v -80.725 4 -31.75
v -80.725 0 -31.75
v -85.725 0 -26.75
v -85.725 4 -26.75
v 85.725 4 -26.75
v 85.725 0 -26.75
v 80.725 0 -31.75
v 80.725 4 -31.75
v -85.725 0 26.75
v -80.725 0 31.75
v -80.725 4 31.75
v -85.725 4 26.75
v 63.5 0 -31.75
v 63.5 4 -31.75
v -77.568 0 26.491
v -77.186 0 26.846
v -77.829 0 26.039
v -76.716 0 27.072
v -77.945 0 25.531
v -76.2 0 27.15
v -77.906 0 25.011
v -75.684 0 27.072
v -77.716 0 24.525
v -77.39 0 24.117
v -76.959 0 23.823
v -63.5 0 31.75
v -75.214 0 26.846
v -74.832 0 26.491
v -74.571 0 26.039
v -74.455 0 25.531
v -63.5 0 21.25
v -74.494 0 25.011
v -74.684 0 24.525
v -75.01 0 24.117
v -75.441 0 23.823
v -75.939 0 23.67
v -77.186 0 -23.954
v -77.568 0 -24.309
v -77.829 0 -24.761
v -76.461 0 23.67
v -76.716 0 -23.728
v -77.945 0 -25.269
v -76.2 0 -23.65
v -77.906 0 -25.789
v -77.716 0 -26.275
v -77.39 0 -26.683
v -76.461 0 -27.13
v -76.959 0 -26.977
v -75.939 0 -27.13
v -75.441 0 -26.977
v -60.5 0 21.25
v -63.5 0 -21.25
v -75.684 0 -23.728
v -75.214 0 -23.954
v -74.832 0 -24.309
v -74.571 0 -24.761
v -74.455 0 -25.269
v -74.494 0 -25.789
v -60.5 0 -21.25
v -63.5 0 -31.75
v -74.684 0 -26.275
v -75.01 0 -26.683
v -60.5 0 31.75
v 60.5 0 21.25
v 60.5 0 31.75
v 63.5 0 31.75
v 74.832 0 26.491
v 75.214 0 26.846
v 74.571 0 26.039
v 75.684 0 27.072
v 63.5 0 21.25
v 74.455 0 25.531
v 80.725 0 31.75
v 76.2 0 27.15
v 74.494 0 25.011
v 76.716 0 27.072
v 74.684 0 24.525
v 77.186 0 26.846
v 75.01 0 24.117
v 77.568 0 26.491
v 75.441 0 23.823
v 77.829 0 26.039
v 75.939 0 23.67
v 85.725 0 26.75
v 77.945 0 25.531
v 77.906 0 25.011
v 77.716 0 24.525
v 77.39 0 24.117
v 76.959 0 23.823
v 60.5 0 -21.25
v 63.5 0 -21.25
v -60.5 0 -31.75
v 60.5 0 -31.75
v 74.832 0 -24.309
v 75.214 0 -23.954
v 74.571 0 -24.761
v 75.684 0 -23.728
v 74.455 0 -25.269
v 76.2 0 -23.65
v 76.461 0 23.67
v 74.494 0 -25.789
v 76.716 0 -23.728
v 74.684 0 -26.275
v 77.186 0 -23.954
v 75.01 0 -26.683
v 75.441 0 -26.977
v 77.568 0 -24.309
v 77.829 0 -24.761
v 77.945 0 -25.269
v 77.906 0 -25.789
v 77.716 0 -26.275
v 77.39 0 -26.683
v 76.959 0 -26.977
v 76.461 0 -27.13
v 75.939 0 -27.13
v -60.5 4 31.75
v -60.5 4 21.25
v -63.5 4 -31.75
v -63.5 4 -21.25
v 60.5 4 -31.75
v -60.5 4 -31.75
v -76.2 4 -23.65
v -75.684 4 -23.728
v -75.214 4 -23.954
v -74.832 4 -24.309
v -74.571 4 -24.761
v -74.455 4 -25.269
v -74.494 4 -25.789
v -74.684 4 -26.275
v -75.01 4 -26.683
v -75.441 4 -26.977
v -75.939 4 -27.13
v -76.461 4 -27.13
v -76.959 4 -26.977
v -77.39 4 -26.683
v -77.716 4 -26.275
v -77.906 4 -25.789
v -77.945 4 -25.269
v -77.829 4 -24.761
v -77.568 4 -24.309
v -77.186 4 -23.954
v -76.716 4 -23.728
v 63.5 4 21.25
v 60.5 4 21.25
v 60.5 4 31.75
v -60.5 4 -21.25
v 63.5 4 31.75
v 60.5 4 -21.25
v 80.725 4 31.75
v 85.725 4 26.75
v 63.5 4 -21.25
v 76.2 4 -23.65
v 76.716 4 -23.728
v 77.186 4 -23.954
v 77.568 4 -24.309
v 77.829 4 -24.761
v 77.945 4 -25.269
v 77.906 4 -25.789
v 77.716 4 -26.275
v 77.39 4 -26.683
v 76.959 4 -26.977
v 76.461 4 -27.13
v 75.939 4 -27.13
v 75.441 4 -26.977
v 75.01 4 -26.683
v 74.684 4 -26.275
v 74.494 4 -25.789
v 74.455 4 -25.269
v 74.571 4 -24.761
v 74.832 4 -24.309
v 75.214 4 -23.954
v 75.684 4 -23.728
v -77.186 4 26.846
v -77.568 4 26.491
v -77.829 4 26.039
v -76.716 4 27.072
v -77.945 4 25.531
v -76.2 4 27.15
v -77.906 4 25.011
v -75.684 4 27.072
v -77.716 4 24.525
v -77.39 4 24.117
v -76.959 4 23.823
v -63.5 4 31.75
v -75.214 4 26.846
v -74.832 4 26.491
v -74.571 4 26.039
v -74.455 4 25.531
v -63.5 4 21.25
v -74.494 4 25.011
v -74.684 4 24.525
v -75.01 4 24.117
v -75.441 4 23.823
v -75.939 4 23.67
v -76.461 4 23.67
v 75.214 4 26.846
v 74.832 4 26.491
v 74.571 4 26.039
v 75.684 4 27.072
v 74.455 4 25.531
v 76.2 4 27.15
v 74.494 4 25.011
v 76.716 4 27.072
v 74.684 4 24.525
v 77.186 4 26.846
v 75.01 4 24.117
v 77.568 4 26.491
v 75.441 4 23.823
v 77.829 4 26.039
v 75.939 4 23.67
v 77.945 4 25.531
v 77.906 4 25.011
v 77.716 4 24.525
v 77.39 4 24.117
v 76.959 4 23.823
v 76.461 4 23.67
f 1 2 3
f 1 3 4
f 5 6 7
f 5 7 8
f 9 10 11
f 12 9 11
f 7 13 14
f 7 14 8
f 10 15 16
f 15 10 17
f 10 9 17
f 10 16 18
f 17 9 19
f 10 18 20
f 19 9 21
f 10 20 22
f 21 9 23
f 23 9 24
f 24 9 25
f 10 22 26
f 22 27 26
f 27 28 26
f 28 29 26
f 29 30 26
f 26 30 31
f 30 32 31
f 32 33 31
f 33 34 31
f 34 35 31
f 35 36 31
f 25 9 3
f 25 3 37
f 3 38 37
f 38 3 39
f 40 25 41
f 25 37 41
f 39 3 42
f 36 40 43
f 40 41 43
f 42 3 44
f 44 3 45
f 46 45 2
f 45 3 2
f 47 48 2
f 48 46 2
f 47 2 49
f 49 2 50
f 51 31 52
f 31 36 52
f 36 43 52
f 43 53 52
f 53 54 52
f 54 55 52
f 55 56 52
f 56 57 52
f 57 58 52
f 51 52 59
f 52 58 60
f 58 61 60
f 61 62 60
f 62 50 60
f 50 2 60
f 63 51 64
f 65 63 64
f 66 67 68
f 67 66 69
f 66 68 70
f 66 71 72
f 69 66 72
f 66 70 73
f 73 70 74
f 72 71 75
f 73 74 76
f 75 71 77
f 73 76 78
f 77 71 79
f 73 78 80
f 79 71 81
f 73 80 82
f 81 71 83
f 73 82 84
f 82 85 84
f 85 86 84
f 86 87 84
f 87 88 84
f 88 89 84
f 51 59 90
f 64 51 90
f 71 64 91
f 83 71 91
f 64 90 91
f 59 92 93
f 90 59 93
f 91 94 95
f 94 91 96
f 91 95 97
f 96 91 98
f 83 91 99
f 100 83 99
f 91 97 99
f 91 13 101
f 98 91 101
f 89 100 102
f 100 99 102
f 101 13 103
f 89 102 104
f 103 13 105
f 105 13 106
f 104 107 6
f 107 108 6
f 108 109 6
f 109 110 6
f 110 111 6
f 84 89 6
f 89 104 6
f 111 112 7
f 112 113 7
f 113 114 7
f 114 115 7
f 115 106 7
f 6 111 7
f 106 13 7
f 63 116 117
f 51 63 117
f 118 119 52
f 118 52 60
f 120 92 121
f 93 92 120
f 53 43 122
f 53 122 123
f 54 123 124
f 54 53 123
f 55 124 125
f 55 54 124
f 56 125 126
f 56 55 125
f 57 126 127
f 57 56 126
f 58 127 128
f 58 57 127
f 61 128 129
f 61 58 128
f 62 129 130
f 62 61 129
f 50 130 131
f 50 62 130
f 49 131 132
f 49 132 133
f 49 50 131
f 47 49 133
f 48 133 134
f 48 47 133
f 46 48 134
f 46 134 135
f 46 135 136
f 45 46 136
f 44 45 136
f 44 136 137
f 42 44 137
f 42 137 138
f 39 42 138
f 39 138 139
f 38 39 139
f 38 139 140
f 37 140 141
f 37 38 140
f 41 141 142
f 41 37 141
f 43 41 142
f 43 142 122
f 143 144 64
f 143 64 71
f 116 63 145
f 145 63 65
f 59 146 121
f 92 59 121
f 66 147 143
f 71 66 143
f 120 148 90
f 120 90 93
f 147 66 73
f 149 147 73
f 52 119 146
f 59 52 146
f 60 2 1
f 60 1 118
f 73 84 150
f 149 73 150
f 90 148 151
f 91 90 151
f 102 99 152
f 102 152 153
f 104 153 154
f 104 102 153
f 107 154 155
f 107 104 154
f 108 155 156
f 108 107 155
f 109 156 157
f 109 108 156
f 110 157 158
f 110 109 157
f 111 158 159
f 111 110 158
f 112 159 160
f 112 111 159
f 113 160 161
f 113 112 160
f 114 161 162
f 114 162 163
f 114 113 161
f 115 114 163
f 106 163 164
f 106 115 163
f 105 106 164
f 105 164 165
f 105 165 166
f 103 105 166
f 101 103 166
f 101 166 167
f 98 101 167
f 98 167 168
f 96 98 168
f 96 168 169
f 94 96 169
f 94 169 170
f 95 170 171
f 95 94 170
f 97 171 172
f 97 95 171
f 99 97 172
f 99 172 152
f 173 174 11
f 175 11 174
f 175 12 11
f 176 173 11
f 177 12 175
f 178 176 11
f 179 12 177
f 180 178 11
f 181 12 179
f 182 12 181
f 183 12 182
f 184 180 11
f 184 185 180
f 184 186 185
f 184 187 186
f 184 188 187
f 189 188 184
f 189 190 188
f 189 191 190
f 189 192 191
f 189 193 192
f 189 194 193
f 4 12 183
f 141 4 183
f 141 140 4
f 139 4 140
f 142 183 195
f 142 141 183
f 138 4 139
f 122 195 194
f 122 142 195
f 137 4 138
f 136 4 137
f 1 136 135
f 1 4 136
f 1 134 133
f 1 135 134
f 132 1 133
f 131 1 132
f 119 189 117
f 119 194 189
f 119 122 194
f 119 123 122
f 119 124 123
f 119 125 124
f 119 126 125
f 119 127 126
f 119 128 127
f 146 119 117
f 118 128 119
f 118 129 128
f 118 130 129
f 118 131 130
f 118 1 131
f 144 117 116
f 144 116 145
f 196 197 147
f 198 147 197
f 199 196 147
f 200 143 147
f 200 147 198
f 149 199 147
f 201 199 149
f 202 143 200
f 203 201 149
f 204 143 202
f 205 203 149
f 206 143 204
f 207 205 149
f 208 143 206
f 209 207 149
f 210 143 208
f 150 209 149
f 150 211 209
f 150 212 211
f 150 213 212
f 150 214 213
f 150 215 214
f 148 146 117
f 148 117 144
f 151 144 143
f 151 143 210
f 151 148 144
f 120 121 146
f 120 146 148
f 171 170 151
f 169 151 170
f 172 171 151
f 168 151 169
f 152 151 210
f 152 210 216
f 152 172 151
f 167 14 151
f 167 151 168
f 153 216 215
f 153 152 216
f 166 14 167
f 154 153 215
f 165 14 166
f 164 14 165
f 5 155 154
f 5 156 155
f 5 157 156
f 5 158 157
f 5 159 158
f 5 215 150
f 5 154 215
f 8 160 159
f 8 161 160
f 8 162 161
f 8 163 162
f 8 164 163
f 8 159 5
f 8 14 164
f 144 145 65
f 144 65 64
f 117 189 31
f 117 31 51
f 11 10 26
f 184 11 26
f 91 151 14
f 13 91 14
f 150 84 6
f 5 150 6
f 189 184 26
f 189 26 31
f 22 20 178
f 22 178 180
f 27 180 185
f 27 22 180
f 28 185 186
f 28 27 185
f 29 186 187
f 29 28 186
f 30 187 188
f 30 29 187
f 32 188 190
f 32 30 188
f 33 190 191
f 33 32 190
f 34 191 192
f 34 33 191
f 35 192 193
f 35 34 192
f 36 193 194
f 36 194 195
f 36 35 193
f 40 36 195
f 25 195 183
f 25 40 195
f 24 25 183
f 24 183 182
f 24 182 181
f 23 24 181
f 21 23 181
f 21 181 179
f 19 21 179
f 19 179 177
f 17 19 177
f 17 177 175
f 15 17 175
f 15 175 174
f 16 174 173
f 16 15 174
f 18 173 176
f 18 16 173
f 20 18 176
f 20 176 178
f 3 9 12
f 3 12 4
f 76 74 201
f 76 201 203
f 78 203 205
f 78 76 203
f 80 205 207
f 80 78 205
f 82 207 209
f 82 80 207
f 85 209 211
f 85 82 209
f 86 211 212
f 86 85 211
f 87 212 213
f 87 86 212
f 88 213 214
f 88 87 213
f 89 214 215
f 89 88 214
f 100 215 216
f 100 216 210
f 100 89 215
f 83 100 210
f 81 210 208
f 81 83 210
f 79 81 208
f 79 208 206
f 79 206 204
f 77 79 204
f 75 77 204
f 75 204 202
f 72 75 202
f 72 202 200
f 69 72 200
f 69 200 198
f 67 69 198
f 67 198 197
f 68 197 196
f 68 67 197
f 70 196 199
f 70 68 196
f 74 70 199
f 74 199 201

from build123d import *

# Parameters (mm, degrees)
SKETCH1_W           = 171.45
SKETCH1_H           = 63.5
SKETCH1_R           = 1.75
BOSS_EXTRUDE1_DEPTH = 4
CHAMFER1_SIZE       = 5
SKETCH3_W           = 3
SKETCH3_H           = 10.5
CUT_EXTRUDE2_DEPTH  = 4


with BuildPart() as part:
    # Sketch1 → Boss-Extrude1 (new body)
    with BuildSketch(Plane(origin=(0, 0, 0), x_dir=(1, 0, 0), z_dir=(0, 1, 0))):
        Rectangle(SKETCH1_W, SKETCH1_H)
        with Locations(Location((-76.2, 25.4, 0), (0, 0, 270))):
            Circle(SKETCH1_R, mode=Mode.SUBTRACT)
        with Locations(Location((-76.2, -25.4, 0), (0, 0, 270))):
            Circle(SKETCH1_R, mode=Mode.SUBTRACT)
        with Locations(Location((76.2, 25.4, 0), (0, 0, 270))):
            Circle(SKETCH1_R, mode=Mode.SUBTRACT)
        with Locations(Location((76.2, -25.4, 0), (0, 0, 270))):
            Circle(SKETCH1_R, mode=Mode.SUBTRACT)
    extrude(amount=BOSS_EXTRUDE1_DEPTH)

    # Chamfer1
    chamfer1_edges = [part.edges().sort_by_distance(p)[0] for p in [
        (85.725, 2, 31.75),
        (-85.725, 2, 31.75),
        (-85.725, 2, -31.75),
        (85.725, 2, -31.75),
    ]]
    chamfer(chamfer1_edges, length=CHAMFER1_SIZE)

    # Sketch3 → Cut-Extrude2 (cut)
    with BuildSketch(Plane(origin=(0, 4, 0), x_dir=(1, 0, 0), z_dir=(0, 1, 0))):
        with Locations((62, -26.5)):
            Rectangle(SKETCH3_W, SKETCH3_H)
        with Locations((62, 26.5)):
            Rectangle(SKETCH3_W, SKETCH3_H)
        with Locations((-62, -26.5)):
            Rectangle(SKETCH3_W, SKETCH3_H)
        with Locations((-62, 26.5)):
            Rectangle(SKETCH3_W, SKETCH3_H)
    extrude(amount=-CUT_EXTRUDE2_DEPTH, mode=Mode.SUBTRACT)


solid = part.part
